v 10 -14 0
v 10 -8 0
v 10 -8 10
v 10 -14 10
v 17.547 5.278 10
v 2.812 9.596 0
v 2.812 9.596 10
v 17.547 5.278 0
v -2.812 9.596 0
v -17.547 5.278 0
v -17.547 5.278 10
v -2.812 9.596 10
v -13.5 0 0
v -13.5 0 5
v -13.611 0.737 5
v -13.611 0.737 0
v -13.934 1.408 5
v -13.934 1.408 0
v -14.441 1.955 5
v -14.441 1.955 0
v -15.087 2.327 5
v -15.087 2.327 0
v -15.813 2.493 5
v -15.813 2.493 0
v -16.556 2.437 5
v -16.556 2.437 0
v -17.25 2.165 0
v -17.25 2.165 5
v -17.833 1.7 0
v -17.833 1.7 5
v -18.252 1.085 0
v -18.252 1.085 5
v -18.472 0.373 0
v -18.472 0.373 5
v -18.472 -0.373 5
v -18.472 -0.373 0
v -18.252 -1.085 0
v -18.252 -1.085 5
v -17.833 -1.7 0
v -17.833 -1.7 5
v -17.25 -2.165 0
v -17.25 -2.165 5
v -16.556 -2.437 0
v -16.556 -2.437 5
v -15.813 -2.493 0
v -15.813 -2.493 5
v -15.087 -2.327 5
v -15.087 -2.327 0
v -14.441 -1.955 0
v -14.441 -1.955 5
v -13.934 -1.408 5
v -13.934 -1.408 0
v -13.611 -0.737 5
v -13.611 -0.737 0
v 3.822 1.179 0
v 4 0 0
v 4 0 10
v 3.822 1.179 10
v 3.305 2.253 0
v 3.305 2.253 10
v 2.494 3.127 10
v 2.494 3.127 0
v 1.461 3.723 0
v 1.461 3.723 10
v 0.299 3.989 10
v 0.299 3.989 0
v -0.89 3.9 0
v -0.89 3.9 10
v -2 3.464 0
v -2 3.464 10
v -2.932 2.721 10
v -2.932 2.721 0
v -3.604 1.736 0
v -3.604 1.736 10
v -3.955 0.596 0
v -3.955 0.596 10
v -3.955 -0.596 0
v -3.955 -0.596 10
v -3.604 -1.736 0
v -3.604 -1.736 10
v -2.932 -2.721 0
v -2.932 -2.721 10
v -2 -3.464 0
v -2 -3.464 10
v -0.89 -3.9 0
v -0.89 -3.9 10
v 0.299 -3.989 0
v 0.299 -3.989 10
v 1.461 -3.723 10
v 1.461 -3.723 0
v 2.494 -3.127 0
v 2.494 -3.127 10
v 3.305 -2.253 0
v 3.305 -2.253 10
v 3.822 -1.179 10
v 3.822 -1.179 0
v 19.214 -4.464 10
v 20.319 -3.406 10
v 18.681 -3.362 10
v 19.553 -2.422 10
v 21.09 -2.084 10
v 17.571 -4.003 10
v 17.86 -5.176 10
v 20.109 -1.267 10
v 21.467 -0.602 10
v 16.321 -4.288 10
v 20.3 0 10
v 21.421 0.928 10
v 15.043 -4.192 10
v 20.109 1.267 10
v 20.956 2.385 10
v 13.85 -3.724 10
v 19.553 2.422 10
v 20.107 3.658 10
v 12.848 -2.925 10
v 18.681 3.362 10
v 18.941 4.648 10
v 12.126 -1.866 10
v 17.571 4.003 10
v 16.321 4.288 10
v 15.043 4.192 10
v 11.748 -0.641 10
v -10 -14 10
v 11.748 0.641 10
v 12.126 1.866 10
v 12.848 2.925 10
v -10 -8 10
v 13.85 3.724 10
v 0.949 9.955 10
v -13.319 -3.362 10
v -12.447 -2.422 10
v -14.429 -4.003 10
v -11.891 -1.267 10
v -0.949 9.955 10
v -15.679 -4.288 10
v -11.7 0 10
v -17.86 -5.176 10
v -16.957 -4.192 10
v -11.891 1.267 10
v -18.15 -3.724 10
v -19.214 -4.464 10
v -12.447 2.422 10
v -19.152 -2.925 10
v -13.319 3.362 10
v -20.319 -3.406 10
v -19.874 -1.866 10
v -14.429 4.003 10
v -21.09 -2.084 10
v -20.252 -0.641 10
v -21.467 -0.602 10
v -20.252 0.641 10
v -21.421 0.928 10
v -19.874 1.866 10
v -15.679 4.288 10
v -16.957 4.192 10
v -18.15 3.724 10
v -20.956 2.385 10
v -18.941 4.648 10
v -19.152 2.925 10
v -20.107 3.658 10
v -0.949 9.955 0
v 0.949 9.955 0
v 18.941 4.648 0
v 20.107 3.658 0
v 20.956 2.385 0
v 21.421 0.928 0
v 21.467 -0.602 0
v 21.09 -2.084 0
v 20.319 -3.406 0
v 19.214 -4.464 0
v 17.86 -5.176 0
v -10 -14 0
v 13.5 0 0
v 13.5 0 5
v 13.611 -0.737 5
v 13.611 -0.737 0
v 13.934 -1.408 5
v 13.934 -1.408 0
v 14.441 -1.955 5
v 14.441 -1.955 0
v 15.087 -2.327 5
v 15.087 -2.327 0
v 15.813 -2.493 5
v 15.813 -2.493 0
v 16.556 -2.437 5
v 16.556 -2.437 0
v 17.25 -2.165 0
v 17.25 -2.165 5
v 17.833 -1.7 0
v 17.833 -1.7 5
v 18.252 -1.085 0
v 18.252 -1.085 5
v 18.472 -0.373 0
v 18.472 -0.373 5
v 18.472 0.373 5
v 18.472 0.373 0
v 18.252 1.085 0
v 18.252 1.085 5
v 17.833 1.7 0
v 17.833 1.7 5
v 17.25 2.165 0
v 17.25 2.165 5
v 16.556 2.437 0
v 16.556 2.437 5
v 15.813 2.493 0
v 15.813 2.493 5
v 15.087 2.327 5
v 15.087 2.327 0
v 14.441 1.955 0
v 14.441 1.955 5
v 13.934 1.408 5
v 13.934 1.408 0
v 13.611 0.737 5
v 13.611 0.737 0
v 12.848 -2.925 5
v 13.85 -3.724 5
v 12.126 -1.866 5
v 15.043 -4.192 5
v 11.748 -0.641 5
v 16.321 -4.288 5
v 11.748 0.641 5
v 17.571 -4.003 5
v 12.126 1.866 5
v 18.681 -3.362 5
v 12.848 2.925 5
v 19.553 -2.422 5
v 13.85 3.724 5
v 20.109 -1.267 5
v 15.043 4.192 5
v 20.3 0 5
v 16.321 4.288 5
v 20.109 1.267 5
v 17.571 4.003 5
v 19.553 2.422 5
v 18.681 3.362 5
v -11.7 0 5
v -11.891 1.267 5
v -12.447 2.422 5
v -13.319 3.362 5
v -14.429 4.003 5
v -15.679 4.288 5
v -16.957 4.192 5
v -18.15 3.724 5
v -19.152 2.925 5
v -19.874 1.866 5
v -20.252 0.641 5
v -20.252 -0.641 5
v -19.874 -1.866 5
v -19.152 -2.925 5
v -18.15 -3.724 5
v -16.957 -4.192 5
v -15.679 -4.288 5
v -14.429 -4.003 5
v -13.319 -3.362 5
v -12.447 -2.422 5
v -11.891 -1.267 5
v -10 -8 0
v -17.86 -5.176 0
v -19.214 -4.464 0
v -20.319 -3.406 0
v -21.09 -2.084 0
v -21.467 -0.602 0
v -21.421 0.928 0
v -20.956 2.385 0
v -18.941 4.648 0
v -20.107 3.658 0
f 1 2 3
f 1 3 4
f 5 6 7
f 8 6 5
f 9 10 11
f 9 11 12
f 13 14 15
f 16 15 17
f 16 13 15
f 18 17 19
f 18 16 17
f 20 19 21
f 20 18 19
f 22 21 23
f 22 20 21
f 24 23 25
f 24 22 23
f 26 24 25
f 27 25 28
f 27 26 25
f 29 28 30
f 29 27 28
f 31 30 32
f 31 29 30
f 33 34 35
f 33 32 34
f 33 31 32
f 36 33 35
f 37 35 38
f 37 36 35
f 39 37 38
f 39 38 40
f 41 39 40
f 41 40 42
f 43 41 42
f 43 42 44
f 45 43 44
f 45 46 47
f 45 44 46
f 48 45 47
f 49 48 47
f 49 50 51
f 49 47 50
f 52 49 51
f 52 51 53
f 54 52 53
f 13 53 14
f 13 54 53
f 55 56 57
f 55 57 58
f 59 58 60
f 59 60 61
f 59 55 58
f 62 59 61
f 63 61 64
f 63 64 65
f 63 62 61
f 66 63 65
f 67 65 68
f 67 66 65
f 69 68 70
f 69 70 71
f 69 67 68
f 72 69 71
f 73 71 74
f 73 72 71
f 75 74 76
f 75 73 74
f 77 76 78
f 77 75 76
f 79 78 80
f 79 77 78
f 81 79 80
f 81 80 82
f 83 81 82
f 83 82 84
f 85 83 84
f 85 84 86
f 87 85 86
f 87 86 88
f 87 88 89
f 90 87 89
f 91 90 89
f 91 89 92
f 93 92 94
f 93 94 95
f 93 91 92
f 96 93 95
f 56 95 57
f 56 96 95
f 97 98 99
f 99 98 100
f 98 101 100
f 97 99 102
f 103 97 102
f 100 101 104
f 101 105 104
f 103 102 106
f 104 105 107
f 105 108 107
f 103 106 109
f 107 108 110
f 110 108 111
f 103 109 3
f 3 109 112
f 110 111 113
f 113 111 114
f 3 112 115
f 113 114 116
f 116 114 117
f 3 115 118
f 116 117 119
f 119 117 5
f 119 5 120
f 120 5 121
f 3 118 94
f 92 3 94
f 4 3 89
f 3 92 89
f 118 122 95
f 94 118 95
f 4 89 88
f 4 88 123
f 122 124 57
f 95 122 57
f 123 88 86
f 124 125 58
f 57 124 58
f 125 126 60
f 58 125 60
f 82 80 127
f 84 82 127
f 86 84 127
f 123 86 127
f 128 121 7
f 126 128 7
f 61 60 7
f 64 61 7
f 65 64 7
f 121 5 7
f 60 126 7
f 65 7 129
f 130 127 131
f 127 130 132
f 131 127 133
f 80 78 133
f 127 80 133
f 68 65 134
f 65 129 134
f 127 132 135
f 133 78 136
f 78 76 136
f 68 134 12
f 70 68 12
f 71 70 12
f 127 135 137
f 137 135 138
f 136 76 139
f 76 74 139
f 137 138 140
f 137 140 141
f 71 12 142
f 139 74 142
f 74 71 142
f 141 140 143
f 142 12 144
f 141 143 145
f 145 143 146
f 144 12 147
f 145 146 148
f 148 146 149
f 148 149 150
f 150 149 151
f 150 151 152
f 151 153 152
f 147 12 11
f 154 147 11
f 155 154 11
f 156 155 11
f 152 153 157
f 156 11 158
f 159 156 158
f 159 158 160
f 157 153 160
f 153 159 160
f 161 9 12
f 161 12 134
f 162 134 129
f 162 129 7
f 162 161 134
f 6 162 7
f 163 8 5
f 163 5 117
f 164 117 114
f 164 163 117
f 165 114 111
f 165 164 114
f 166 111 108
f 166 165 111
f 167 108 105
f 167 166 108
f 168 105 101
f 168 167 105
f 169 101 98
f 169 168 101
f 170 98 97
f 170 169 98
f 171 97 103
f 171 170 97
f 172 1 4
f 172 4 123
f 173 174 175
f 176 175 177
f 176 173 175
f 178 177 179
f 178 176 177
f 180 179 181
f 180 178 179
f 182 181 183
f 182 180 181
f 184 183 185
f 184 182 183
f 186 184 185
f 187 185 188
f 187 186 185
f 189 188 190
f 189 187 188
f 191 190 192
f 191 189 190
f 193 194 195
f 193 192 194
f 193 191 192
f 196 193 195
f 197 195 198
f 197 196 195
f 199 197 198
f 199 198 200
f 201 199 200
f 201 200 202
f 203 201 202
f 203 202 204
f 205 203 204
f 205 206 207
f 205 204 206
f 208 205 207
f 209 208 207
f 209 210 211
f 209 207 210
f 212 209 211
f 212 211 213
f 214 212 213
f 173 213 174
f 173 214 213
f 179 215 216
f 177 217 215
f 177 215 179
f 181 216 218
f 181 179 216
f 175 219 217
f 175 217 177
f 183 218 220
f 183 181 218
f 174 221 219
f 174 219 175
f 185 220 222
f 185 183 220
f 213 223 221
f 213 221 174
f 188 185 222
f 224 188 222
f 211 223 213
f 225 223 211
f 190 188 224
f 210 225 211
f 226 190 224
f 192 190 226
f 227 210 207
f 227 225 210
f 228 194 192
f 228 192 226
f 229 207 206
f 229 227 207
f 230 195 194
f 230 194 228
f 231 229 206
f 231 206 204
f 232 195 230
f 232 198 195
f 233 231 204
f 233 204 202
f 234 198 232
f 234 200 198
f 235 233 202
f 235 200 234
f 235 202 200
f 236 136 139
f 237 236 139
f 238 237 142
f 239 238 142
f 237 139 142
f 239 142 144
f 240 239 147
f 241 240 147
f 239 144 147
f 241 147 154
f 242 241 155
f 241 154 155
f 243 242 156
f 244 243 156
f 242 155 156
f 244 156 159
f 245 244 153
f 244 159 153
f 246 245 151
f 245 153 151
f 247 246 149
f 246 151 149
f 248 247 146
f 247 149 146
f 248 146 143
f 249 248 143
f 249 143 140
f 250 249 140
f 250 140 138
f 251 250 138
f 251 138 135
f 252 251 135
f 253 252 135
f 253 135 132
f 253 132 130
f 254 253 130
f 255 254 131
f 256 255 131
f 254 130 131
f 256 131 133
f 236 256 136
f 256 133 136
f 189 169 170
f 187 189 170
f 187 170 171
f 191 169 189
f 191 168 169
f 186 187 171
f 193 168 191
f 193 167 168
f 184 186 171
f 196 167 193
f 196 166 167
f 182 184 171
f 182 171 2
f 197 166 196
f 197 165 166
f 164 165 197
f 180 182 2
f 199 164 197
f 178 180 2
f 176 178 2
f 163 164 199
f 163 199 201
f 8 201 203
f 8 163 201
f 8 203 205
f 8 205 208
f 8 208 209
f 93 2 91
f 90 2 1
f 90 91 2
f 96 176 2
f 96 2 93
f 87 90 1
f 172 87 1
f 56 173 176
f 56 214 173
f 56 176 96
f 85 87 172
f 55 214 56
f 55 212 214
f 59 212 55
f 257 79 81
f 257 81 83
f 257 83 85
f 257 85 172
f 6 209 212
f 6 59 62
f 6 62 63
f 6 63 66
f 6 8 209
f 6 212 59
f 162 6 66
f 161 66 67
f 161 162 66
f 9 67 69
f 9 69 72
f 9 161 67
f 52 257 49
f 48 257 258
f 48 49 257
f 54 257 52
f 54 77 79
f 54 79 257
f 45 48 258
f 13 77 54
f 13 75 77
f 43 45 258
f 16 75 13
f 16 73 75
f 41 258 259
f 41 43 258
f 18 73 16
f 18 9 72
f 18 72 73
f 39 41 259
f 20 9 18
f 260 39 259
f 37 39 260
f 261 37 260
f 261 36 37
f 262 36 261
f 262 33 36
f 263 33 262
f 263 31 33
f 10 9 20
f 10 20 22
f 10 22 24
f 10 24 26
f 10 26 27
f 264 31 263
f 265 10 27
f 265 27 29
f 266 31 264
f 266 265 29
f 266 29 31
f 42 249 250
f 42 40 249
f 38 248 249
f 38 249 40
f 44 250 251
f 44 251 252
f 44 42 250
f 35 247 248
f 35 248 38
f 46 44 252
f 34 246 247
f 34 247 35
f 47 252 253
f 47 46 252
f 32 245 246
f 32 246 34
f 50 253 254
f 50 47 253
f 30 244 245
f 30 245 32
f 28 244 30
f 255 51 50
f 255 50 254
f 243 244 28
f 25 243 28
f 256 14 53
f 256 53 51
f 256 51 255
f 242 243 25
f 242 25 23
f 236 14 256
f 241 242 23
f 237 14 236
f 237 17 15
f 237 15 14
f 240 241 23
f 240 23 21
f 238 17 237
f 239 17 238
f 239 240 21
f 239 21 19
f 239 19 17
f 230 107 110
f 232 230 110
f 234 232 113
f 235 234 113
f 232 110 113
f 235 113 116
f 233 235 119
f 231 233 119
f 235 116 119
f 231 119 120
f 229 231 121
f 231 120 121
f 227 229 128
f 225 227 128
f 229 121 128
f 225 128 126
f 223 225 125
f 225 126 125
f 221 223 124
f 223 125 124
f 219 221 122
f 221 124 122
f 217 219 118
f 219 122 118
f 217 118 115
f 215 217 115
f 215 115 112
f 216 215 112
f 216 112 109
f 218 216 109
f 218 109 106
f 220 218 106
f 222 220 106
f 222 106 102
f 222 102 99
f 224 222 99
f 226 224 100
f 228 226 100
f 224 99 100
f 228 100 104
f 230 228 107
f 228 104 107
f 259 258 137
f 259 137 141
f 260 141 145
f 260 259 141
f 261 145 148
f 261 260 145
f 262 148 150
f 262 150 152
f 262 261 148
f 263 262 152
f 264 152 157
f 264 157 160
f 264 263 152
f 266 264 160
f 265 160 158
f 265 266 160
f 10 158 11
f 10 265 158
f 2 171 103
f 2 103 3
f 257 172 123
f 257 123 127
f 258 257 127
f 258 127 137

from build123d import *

# Parameters (mm, degrees)
SKETCH_1_R          = 4
SKETCH_1_R_2        = 2.5
EXTRUDE_1_DEPTH     = 10
SKETCH_2_R          = 4.3
CUT_EXTRUDE_1_DEPTH = 5


with BuildPart() as part:
    # 草图1 → 凸台-拉伸1 (new body)
    with BuildSketch(Plane.XY):
        with BuildLine():
            Line((-10, -14), (-10, -8))
            Line((-10, -8), (-17.859724479, -5.17604336))
            ThreePointArc((-17.859724479, -5.17604336), (-21.497538815, 0.16452044), (-17.546875, 5.277989933))
            Line((-17.546875, 5.277989933), (-2.8125, 9.596345333))
            ThreePointArc((-2.8125, 9.596345333), (0, 10), (2.8125, 9.596345333))
            Line((2.8125, 9.596345333), (17.546875, 5.277989933))
            ThreePointArc((17.546875, 5.277989933), (21.497538815, 0.16452044), (17.859724479, -5.17604336))
            Line((17.859724479, -5.17604336), (10, -8))
            Line((10, -8), (10, -14))
            Line((10, -14), (-10, -14))
        make_face()
        Circle(SKETCH_1_R, mode=Mode.SUBTRACT)
        with Locations((-16, 0)):
            Circle(SKETCH_1_R_2, mode=Mode.SUBTRACT)
        with Locations(Location((16, 0, 0), (0, 0, 180))):
            Circle(SKETCH_1_R_2, mode=Mode.SUBTRACT)
    extrude(amount=EXTRUDE_1_DEPTH)

    # 草图2 → 切除-拉伸1 (cut)
    with BuildSketch(Plane.XY.offset(10)):
        with Locations((-16, 0)):
            Circle(SKETCH_2_R)
        with Locations((16, 0)):
            Circle(SKETCH_2_R)
    extrude(amount=-CUT_EXTRUDE_1_DEPTH, mode=Mode.SUBTRACT)


solid = part.part
